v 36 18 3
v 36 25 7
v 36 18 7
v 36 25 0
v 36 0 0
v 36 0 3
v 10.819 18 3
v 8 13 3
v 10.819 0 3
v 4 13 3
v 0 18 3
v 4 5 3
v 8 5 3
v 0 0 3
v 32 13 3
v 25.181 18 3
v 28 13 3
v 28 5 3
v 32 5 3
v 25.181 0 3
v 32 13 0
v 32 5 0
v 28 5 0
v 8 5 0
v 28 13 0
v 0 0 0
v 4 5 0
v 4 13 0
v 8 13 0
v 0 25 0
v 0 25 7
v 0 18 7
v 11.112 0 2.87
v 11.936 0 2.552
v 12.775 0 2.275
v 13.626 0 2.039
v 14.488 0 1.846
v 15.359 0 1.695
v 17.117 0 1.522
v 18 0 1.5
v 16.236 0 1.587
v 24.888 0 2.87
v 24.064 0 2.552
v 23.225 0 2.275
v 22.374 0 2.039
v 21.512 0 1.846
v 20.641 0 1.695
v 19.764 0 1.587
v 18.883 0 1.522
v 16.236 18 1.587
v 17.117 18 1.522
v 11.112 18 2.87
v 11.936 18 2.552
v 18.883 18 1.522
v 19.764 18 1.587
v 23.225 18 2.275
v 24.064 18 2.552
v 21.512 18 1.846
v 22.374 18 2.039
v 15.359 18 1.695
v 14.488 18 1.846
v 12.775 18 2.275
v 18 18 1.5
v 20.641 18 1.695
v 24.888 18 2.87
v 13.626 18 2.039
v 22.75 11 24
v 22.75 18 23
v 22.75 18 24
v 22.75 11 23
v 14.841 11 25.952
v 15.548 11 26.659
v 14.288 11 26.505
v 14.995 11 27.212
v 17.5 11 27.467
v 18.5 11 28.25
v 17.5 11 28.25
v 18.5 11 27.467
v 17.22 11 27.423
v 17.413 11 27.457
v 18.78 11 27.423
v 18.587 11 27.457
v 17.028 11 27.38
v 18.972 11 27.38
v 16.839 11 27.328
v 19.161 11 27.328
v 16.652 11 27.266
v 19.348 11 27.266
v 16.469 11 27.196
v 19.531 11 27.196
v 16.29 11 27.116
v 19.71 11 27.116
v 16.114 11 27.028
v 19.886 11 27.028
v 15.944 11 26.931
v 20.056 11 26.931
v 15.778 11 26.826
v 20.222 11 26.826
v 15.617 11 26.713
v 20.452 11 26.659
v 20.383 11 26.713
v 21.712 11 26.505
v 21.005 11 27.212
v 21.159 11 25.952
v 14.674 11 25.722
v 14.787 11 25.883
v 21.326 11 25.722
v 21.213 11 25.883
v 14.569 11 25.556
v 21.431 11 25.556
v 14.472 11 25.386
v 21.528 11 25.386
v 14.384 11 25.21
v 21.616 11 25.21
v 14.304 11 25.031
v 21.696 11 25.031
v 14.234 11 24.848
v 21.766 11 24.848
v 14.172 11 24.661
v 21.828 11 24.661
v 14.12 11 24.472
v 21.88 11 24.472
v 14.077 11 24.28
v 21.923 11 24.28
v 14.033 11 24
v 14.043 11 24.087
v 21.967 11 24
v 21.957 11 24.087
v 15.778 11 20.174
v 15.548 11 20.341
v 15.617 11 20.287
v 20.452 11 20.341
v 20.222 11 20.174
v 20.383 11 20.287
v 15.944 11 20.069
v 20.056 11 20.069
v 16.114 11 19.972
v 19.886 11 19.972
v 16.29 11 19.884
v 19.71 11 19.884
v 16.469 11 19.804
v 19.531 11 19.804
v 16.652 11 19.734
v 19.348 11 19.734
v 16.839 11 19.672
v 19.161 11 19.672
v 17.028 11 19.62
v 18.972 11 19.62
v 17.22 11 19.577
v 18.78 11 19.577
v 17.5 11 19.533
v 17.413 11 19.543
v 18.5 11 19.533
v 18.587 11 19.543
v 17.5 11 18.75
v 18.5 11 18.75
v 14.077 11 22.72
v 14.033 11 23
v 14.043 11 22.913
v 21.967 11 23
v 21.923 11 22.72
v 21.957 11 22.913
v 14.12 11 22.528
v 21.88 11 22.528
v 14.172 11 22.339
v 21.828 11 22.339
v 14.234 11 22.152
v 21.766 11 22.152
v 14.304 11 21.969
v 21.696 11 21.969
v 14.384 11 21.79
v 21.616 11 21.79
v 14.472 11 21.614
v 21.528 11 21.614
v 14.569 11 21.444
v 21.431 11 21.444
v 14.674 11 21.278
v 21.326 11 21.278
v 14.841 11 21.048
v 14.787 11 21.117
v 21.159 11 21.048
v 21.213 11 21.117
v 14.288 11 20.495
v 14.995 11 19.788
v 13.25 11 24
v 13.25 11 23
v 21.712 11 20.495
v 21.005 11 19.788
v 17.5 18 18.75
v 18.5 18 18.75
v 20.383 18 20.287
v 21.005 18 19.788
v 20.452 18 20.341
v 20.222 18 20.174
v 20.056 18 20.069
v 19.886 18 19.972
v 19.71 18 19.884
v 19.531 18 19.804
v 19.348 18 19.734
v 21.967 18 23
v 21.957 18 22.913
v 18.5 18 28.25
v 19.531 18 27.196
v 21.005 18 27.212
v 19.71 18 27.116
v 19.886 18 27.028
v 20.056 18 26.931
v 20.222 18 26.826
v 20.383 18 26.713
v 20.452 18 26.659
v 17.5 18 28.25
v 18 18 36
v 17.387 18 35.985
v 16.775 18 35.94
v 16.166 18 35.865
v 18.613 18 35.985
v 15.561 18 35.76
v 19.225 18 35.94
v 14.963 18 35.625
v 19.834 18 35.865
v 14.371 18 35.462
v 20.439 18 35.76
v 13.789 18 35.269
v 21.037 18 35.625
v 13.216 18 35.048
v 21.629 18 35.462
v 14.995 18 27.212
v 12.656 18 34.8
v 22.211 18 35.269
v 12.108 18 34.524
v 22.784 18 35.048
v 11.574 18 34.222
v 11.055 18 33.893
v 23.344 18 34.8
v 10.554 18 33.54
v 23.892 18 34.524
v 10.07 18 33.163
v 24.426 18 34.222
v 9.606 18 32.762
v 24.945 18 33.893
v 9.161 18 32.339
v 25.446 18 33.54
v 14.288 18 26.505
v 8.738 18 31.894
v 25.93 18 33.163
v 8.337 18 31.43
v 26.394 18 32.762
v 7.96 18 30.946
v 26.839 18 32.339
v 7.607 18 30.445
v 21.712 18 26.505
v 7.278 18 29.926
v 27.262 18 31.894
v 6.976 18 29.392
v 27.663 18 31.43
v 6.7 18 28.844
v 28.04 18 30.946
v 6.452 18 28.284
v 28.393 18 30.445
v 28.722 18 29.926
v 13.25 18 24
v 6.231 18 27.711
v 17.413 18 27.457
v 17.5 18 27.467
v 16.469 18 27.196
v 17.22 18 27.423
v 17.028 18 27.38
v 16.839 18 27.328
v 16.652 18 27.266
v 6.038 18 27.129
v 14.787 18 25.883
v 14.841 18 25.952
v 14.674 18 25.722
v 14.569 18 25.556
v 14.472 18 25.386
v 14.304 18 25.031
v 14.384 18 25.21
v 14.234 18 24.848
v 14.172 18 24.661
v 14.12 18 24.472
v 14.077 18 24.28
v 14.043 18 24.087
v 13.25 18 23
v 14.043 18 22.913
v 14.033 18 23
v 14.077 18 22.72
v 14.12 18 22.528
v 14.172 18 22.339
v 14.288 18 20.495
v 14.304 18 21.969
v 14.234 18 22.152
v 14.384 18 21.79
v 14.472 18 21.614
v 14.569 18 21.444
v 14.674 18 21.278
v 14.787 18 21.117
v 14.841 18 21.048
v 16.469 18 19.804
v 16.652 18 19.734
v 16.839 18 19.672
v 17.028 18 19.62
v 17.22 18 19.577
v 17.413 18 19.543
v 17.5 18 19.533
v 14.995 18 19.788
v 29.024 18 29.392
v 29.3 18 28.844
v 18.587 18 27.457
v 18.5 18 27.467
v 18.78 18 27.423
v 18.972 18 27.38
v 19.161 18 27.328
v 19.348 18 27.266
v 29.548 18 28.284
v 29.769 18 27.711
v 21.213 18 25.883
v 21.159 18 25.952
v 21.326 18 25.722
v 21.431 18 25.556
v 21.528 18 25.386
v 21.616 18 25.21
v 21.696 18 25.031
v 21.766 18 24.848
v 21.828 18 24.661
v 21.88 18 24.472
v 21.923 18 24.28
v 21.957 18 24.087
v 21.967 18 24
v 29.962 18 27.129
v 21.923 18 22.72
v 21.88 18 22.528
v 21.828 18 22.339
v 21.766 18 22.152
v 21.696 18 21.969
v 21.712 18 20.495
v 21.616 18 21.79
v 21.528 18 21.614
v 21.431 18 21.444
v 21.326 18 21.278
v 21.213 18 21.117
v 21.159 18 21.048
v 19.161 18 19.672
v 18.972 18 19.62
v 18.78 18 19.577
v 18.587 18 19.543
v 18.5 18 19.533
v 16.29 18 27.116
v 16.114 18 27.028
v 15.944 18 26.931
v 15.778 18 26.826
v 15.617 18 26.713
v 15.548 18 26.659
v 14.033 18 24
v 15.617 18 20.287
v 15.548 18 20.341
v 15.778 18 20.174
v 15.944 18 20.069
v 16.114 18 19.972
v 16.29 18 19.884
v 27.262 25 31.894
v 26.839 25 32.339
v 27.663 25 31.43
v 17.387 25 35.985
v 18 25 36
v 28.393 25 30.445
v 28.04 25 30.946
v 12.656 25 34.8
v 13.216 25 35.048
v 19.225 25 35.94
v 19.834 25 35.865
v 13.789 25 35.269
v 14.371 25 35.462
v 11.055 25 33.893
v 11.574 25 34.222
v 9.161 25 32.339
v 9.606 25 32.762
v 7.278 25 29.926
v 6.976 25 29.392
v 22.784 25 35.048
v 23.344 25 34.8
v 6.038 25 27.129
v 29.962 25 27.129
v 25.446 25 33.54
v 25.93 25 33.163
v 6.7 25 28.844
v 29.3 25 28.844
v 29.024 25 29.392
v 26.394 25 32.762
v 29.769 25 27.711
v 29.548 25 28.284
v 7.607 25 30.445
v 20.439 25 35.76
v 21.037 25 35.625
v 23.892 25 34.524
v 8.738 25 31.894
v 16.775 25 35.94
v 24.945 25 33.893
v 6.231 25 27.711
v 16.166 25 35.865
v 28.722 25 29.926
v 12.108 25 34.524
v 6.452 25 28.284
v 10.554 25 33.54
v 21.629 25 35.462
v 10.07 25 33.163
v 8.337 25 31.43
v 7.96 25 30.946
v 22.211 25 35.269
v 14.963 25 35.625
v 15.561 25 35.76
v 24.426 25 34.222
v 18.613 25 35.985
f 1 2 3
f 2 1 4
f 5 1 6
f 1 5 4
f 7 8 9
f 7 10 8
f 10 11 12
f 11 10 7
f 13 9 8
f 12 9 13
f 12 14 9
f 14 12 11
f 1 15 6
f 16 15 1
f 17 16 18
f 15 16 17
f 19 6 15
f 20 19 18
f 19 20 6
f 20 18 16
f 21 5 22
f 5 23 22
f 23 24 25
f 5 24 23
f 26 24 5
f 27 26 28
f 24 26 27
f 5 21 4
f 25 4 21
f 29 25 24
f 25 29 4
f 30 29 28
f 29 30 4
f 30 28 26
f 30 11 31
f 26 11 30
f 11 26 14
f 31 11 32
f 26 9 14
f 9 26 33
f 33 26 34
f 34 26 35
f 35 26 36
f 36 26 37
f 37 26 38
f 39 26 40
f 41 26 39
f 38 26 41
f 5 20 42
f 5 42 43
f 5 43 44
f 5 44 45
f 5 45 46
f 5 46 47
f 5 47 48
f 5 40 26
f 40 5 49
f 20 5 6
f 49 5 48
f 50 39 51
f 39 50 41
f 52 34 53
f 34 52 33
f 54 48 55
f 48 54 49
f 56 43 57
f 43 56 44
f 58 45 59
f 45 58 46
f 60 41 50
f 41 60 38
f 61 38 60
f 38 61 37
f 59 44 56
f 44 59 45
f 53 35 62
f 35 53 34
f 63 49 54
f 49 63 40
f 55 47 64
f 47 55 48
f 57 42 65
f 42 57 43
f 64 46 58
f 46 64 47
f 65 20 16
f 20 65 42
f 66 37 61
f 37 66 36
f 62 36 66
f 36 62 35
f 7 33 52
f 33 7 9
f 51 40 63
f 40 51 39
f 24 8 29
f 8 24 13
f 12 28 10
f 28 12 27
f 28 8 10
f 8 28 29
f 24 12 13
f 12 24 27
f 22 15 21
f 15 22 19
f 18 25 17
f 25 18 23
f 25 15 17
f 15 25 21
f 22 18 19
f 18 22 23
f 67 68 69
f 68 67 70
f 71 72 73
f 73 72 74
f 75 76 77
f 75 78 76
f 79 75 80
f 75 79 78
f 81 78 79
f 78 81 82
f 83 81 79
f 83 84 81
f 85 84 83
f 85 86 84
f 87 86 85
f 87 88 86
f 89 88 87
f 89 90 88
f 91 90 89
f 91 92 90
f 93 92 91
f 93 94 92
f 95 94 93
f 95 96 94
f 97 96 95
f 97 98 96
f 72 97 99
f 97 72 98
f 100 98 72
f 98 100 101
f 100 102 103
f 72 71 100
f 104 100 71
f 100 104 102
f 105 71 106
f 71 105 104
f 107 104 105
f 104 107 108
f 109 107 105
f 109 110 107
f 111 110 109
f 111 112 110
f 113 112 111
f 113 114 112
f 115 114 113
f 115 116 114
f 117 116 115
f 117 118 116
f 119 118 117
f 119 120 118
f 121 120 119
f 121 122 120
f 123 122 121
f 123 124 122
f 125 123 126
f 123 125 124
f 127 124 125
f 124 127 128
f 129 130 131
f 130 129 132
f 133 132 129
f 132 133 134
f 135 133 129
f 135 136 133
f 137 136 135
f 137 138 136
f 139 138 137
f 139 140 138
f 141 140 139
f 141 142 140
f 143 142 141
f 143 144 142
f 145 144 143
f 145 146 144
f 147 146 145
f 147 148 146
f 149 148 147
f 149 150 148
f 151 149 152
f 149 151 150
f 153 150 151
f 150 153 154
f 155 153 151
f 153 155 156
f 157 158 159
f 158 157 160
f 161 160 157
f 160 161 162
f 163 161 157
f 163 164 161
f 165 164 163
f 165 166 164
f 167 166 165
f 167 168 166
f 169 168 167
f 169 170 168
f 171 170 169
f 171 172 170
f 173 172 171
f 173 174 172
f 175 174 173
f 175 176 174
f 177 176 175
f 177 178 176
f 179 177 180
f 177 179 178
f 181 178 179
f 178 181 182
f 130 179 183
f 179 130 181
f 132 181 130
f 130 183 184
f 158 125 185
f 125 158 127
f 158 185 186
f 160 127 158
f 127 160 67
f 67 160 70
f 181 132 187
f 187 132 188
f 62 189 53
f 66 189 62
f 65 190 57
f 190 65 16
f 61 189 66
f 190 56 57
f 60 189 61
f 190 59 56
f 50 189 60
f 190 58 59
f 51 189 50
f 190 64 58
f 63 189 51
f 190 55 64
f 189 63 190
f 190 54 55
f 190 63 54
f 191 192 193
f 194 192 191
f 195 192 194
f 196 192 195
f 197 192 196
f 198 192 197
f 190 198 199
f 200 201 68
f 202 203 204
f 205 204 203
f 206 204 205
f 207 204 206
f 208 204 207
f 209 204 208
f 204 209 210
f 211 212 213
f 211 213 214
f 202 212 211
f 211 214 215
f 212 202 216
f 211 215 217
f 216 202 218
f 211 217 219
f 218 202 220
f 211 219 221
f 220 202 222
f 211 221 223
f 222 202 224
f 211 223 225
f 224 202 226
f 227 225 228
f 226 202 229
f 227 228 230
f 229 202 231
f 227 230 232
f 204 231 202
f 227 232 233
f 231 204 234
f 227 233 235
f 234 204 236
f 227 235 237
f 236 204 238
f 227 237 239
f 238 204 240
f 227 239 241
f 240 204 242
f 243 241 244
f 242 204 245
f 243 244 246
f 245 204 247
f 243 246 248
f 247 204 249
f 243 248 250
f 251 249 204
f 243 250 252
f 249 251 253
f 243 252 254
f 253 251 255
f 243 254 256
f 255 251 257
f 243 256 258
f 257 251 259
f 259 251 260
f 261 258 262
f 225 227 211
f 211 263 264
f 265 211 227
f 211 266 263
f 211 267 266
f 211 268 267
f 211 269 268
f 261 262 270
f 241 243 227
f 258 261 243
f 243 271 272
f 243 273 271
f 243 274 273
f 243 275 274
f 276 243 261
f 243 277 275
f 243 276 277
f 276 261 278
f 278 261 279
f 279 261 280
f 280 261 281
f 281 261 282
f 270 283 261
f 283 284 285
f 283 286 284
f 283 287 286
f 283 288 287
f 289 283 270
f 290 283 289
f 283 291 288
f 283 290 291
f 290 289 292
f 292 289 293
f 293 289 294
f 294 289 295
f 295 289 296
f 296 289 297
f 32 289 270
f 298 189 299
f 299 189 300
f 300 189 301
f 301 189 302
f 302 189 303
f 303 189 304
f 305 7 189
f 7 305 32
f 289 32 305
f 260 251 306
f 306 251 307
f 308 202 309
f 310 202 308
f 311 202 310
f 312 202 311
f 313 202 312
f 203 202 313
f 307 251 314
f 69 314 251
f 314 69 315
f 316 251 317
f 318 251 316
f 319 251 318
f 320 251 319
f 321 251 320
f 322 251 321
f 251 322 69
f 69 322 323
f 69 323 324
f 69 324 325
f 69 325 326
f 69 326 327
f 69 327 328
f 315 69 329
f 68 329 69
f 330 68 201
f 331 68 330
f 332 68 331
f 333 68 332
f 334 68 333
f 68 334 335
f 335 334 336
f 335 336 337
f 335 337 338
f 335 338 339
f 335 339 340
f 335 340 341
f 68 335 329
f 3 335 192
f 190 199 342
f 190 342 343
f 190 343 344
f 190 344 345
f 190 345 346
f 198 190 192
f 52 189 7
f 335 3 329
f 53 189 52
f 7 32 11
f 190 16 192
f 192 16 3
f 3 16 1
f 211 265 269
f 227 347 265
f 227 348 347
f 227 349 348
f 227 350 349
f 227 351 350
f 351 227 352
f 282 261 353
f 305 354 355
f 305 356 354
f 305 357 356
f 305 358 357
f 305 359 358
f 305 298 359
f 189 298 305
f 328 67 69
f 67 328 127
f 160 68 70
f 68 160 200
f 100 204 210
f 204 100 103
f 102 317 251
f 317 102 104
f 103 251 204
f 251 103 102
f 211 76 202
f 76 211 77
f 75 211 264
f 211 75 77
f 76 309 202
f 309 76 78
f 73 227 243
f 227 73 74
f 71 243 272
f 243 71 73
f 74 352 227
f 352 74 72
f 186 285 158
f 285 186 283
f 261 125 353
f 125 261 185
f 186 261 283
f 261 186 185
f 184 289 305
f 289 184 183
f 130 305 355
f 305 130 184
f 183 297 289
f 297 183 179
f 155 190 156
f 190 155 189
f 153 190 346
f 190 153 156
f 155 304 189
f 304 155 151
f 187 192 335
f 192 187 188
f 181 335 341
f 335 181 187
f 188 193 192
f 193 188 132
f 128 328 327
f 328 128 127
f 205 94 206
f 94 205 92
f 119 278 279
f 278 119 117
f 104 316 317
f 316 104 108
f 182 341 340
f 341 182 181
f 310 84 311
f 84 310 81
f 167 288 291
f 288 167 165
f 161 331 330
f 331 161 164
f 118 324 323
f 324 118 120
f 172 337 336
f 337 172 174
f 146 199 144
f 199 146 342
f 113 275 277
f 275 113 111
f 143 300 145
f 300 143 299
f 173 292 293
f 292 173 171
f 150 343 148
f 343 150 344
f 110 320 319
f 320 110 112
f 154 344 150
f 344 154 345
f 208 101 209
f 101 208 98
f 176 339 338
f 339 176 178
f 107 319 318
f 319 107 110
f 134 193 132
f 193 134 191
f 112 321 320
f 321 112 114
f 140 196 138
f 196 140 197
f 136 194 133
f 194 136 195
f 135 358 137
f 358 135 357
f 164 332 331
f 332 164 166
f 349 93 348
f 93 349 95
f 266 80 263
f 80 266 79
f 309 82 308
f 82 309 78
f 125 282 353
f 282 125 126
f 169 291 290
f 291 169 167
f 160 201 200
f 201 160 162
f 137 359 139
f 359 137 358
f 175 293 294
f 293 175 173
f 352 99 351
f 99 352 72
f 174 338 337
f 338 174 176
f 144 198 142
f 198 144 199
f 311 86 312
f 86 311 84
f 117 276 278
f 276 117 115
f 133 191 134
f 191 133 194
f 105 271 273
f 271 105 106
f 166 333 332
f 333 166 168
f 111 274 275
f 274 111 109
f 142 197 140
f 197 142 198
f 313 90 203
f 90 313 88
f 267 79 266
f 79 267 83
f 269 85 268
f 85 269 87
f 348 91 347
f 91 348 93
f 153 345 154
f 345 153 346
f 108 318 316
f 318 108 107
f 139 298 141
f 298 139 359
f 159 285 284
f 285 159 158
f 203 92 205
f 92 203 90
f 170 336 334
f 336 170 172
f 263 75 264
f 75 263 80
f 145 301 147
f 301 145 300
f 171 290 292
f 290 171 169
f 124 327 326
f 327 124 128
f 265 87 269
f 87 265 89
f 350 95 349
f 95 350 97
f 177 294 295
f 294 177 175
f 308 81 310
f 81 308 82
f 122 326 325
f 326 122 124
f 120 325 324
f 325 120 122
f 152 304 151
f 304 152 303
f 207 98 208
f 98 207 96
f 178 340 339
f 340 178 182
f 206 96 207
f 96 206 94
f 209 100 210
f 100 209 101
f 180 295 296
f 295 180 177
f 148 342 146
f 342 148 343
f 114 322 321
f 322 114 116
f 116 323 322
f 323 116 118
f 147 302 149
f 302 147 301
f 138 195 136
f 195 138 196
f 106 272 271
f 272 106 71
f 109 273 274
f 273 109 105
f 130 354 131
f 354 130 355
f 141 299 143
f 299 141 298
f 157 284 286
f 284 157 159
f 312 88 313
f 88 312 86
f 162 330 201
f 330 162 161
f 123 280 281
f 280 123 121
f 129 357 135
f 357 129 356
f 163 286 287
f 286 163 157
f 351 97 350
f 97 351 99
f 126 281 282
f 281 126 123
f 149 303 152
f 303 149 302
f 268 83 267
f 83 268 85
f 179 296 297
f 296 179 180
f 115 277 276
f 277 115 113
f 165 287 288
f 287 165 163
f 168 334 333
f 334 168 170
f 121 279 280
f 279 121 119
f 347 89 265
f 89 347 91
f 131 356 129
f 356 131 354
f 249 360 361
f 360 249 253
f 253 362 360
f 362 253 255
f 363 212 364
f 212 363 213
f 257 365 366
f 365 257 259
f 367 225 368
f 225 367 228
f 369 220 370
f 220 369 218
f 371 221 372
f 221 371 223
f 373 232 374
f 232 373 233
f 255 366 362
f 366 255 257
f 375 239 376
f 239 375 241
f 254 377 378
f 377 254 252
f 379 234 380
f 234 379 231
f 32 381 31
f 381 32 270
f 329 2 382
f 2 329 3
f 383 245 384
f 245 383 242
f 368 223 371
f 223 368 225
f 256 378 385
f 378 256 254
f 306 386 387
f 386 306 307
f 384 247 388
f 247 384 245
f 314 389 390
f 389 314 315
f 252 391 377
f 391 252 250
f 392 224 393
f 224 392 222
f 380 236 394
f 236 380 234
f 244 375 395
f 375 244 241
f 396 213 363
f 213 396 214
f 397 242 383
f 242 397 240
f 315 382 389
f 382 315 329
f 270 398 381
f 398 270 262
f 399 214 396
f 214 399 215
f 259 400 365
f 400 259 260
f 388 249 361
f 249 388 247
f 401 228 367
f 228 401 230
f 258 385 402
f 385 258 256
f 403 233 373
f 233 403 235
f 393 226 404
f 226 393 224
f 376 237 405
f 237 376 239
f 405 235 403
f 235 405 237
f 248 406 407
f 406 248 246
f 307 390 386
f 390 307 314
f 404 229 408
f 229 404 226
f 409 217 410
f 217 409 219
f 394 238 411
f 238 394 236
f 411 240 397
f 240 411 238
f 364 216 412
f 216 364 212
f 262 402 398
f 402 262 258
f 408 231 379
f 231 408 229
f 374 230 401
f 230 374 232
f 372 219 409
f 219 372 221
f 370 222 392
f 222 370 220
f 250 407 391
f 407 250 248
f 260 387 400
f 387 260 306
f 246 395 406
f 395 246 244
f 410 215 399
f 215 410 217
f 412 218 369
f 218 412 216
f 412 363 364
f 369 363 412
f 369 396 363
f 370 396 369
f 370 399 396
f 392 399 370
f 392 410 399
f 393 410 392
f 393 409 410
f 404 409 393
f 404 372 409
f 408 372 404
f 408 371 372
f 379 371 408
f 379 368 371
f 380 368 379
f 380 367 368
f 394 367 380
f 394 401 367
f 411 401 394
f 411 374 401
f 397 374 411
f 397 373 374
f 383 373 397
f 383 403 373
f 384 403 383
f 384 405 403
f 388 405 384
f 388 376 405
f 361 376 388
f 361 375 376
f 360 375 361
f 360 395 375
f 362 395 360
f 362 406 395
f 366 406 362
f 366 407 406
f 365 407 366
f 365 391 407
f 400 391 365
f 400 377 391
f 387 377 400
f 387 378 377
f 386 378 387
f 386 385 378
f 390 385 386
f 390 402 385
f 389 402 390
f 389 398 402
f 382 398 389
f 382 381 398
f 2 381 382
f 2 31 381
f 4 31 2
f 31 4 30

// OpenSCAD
$fn=128;

module base(w=36, d=23, h=3) {
    // base
    difference() {
        cube([w, d, h]);
        
        // roll
        translate([w/2, d, (h + w)/2])
        rotate([90, 0, 0])
        cylinder(d=w, h=23);
        
        // hole 1
        translate([4, 5, 0])
        cube([4, 8, 3]);
        
        // hole 2
        translate([36 - 8, 5, 0])
        cube([4, 8, 3]);
    }
    
}

module holder(w=36, h=36, t=7, d=25) {
    hull() {
        // base
        cube([w, t, t]);
        
        // calculate holder top height
        z = h - d / 2;
        
        // rounded top
        translate([w/2, t, z])
        rotate([90, 0, 0])
        cylinder(d=d, h=t);
    }
}

module rollmount(d=8, h=7, tooth_count = 8) {
    cylinder(d=d, h=h);
    
    step = 360/tooth_count;
    for(i = [0 : step : 360]) {
        rotate([0, 0, i])
        translate([d/2, 0, h/2])
        cube([1.5, 1, h], center=true);
    }
}

module montage() {
    base();
    
    translate([0, 23 - 5, 0])
    holder();
    
    height = 36 - 25 / 2;
    
    translate([36/2, 23-5, height])
    rotate([90, 0, 0])
    rollmount();
}

module side_adapter() {
    difference() {
        union() {
            cylinder(d=30, h=1);
            
        }
        
        cylinder(d=10, h=10);
    }
}

//side_adapter();

montage();
